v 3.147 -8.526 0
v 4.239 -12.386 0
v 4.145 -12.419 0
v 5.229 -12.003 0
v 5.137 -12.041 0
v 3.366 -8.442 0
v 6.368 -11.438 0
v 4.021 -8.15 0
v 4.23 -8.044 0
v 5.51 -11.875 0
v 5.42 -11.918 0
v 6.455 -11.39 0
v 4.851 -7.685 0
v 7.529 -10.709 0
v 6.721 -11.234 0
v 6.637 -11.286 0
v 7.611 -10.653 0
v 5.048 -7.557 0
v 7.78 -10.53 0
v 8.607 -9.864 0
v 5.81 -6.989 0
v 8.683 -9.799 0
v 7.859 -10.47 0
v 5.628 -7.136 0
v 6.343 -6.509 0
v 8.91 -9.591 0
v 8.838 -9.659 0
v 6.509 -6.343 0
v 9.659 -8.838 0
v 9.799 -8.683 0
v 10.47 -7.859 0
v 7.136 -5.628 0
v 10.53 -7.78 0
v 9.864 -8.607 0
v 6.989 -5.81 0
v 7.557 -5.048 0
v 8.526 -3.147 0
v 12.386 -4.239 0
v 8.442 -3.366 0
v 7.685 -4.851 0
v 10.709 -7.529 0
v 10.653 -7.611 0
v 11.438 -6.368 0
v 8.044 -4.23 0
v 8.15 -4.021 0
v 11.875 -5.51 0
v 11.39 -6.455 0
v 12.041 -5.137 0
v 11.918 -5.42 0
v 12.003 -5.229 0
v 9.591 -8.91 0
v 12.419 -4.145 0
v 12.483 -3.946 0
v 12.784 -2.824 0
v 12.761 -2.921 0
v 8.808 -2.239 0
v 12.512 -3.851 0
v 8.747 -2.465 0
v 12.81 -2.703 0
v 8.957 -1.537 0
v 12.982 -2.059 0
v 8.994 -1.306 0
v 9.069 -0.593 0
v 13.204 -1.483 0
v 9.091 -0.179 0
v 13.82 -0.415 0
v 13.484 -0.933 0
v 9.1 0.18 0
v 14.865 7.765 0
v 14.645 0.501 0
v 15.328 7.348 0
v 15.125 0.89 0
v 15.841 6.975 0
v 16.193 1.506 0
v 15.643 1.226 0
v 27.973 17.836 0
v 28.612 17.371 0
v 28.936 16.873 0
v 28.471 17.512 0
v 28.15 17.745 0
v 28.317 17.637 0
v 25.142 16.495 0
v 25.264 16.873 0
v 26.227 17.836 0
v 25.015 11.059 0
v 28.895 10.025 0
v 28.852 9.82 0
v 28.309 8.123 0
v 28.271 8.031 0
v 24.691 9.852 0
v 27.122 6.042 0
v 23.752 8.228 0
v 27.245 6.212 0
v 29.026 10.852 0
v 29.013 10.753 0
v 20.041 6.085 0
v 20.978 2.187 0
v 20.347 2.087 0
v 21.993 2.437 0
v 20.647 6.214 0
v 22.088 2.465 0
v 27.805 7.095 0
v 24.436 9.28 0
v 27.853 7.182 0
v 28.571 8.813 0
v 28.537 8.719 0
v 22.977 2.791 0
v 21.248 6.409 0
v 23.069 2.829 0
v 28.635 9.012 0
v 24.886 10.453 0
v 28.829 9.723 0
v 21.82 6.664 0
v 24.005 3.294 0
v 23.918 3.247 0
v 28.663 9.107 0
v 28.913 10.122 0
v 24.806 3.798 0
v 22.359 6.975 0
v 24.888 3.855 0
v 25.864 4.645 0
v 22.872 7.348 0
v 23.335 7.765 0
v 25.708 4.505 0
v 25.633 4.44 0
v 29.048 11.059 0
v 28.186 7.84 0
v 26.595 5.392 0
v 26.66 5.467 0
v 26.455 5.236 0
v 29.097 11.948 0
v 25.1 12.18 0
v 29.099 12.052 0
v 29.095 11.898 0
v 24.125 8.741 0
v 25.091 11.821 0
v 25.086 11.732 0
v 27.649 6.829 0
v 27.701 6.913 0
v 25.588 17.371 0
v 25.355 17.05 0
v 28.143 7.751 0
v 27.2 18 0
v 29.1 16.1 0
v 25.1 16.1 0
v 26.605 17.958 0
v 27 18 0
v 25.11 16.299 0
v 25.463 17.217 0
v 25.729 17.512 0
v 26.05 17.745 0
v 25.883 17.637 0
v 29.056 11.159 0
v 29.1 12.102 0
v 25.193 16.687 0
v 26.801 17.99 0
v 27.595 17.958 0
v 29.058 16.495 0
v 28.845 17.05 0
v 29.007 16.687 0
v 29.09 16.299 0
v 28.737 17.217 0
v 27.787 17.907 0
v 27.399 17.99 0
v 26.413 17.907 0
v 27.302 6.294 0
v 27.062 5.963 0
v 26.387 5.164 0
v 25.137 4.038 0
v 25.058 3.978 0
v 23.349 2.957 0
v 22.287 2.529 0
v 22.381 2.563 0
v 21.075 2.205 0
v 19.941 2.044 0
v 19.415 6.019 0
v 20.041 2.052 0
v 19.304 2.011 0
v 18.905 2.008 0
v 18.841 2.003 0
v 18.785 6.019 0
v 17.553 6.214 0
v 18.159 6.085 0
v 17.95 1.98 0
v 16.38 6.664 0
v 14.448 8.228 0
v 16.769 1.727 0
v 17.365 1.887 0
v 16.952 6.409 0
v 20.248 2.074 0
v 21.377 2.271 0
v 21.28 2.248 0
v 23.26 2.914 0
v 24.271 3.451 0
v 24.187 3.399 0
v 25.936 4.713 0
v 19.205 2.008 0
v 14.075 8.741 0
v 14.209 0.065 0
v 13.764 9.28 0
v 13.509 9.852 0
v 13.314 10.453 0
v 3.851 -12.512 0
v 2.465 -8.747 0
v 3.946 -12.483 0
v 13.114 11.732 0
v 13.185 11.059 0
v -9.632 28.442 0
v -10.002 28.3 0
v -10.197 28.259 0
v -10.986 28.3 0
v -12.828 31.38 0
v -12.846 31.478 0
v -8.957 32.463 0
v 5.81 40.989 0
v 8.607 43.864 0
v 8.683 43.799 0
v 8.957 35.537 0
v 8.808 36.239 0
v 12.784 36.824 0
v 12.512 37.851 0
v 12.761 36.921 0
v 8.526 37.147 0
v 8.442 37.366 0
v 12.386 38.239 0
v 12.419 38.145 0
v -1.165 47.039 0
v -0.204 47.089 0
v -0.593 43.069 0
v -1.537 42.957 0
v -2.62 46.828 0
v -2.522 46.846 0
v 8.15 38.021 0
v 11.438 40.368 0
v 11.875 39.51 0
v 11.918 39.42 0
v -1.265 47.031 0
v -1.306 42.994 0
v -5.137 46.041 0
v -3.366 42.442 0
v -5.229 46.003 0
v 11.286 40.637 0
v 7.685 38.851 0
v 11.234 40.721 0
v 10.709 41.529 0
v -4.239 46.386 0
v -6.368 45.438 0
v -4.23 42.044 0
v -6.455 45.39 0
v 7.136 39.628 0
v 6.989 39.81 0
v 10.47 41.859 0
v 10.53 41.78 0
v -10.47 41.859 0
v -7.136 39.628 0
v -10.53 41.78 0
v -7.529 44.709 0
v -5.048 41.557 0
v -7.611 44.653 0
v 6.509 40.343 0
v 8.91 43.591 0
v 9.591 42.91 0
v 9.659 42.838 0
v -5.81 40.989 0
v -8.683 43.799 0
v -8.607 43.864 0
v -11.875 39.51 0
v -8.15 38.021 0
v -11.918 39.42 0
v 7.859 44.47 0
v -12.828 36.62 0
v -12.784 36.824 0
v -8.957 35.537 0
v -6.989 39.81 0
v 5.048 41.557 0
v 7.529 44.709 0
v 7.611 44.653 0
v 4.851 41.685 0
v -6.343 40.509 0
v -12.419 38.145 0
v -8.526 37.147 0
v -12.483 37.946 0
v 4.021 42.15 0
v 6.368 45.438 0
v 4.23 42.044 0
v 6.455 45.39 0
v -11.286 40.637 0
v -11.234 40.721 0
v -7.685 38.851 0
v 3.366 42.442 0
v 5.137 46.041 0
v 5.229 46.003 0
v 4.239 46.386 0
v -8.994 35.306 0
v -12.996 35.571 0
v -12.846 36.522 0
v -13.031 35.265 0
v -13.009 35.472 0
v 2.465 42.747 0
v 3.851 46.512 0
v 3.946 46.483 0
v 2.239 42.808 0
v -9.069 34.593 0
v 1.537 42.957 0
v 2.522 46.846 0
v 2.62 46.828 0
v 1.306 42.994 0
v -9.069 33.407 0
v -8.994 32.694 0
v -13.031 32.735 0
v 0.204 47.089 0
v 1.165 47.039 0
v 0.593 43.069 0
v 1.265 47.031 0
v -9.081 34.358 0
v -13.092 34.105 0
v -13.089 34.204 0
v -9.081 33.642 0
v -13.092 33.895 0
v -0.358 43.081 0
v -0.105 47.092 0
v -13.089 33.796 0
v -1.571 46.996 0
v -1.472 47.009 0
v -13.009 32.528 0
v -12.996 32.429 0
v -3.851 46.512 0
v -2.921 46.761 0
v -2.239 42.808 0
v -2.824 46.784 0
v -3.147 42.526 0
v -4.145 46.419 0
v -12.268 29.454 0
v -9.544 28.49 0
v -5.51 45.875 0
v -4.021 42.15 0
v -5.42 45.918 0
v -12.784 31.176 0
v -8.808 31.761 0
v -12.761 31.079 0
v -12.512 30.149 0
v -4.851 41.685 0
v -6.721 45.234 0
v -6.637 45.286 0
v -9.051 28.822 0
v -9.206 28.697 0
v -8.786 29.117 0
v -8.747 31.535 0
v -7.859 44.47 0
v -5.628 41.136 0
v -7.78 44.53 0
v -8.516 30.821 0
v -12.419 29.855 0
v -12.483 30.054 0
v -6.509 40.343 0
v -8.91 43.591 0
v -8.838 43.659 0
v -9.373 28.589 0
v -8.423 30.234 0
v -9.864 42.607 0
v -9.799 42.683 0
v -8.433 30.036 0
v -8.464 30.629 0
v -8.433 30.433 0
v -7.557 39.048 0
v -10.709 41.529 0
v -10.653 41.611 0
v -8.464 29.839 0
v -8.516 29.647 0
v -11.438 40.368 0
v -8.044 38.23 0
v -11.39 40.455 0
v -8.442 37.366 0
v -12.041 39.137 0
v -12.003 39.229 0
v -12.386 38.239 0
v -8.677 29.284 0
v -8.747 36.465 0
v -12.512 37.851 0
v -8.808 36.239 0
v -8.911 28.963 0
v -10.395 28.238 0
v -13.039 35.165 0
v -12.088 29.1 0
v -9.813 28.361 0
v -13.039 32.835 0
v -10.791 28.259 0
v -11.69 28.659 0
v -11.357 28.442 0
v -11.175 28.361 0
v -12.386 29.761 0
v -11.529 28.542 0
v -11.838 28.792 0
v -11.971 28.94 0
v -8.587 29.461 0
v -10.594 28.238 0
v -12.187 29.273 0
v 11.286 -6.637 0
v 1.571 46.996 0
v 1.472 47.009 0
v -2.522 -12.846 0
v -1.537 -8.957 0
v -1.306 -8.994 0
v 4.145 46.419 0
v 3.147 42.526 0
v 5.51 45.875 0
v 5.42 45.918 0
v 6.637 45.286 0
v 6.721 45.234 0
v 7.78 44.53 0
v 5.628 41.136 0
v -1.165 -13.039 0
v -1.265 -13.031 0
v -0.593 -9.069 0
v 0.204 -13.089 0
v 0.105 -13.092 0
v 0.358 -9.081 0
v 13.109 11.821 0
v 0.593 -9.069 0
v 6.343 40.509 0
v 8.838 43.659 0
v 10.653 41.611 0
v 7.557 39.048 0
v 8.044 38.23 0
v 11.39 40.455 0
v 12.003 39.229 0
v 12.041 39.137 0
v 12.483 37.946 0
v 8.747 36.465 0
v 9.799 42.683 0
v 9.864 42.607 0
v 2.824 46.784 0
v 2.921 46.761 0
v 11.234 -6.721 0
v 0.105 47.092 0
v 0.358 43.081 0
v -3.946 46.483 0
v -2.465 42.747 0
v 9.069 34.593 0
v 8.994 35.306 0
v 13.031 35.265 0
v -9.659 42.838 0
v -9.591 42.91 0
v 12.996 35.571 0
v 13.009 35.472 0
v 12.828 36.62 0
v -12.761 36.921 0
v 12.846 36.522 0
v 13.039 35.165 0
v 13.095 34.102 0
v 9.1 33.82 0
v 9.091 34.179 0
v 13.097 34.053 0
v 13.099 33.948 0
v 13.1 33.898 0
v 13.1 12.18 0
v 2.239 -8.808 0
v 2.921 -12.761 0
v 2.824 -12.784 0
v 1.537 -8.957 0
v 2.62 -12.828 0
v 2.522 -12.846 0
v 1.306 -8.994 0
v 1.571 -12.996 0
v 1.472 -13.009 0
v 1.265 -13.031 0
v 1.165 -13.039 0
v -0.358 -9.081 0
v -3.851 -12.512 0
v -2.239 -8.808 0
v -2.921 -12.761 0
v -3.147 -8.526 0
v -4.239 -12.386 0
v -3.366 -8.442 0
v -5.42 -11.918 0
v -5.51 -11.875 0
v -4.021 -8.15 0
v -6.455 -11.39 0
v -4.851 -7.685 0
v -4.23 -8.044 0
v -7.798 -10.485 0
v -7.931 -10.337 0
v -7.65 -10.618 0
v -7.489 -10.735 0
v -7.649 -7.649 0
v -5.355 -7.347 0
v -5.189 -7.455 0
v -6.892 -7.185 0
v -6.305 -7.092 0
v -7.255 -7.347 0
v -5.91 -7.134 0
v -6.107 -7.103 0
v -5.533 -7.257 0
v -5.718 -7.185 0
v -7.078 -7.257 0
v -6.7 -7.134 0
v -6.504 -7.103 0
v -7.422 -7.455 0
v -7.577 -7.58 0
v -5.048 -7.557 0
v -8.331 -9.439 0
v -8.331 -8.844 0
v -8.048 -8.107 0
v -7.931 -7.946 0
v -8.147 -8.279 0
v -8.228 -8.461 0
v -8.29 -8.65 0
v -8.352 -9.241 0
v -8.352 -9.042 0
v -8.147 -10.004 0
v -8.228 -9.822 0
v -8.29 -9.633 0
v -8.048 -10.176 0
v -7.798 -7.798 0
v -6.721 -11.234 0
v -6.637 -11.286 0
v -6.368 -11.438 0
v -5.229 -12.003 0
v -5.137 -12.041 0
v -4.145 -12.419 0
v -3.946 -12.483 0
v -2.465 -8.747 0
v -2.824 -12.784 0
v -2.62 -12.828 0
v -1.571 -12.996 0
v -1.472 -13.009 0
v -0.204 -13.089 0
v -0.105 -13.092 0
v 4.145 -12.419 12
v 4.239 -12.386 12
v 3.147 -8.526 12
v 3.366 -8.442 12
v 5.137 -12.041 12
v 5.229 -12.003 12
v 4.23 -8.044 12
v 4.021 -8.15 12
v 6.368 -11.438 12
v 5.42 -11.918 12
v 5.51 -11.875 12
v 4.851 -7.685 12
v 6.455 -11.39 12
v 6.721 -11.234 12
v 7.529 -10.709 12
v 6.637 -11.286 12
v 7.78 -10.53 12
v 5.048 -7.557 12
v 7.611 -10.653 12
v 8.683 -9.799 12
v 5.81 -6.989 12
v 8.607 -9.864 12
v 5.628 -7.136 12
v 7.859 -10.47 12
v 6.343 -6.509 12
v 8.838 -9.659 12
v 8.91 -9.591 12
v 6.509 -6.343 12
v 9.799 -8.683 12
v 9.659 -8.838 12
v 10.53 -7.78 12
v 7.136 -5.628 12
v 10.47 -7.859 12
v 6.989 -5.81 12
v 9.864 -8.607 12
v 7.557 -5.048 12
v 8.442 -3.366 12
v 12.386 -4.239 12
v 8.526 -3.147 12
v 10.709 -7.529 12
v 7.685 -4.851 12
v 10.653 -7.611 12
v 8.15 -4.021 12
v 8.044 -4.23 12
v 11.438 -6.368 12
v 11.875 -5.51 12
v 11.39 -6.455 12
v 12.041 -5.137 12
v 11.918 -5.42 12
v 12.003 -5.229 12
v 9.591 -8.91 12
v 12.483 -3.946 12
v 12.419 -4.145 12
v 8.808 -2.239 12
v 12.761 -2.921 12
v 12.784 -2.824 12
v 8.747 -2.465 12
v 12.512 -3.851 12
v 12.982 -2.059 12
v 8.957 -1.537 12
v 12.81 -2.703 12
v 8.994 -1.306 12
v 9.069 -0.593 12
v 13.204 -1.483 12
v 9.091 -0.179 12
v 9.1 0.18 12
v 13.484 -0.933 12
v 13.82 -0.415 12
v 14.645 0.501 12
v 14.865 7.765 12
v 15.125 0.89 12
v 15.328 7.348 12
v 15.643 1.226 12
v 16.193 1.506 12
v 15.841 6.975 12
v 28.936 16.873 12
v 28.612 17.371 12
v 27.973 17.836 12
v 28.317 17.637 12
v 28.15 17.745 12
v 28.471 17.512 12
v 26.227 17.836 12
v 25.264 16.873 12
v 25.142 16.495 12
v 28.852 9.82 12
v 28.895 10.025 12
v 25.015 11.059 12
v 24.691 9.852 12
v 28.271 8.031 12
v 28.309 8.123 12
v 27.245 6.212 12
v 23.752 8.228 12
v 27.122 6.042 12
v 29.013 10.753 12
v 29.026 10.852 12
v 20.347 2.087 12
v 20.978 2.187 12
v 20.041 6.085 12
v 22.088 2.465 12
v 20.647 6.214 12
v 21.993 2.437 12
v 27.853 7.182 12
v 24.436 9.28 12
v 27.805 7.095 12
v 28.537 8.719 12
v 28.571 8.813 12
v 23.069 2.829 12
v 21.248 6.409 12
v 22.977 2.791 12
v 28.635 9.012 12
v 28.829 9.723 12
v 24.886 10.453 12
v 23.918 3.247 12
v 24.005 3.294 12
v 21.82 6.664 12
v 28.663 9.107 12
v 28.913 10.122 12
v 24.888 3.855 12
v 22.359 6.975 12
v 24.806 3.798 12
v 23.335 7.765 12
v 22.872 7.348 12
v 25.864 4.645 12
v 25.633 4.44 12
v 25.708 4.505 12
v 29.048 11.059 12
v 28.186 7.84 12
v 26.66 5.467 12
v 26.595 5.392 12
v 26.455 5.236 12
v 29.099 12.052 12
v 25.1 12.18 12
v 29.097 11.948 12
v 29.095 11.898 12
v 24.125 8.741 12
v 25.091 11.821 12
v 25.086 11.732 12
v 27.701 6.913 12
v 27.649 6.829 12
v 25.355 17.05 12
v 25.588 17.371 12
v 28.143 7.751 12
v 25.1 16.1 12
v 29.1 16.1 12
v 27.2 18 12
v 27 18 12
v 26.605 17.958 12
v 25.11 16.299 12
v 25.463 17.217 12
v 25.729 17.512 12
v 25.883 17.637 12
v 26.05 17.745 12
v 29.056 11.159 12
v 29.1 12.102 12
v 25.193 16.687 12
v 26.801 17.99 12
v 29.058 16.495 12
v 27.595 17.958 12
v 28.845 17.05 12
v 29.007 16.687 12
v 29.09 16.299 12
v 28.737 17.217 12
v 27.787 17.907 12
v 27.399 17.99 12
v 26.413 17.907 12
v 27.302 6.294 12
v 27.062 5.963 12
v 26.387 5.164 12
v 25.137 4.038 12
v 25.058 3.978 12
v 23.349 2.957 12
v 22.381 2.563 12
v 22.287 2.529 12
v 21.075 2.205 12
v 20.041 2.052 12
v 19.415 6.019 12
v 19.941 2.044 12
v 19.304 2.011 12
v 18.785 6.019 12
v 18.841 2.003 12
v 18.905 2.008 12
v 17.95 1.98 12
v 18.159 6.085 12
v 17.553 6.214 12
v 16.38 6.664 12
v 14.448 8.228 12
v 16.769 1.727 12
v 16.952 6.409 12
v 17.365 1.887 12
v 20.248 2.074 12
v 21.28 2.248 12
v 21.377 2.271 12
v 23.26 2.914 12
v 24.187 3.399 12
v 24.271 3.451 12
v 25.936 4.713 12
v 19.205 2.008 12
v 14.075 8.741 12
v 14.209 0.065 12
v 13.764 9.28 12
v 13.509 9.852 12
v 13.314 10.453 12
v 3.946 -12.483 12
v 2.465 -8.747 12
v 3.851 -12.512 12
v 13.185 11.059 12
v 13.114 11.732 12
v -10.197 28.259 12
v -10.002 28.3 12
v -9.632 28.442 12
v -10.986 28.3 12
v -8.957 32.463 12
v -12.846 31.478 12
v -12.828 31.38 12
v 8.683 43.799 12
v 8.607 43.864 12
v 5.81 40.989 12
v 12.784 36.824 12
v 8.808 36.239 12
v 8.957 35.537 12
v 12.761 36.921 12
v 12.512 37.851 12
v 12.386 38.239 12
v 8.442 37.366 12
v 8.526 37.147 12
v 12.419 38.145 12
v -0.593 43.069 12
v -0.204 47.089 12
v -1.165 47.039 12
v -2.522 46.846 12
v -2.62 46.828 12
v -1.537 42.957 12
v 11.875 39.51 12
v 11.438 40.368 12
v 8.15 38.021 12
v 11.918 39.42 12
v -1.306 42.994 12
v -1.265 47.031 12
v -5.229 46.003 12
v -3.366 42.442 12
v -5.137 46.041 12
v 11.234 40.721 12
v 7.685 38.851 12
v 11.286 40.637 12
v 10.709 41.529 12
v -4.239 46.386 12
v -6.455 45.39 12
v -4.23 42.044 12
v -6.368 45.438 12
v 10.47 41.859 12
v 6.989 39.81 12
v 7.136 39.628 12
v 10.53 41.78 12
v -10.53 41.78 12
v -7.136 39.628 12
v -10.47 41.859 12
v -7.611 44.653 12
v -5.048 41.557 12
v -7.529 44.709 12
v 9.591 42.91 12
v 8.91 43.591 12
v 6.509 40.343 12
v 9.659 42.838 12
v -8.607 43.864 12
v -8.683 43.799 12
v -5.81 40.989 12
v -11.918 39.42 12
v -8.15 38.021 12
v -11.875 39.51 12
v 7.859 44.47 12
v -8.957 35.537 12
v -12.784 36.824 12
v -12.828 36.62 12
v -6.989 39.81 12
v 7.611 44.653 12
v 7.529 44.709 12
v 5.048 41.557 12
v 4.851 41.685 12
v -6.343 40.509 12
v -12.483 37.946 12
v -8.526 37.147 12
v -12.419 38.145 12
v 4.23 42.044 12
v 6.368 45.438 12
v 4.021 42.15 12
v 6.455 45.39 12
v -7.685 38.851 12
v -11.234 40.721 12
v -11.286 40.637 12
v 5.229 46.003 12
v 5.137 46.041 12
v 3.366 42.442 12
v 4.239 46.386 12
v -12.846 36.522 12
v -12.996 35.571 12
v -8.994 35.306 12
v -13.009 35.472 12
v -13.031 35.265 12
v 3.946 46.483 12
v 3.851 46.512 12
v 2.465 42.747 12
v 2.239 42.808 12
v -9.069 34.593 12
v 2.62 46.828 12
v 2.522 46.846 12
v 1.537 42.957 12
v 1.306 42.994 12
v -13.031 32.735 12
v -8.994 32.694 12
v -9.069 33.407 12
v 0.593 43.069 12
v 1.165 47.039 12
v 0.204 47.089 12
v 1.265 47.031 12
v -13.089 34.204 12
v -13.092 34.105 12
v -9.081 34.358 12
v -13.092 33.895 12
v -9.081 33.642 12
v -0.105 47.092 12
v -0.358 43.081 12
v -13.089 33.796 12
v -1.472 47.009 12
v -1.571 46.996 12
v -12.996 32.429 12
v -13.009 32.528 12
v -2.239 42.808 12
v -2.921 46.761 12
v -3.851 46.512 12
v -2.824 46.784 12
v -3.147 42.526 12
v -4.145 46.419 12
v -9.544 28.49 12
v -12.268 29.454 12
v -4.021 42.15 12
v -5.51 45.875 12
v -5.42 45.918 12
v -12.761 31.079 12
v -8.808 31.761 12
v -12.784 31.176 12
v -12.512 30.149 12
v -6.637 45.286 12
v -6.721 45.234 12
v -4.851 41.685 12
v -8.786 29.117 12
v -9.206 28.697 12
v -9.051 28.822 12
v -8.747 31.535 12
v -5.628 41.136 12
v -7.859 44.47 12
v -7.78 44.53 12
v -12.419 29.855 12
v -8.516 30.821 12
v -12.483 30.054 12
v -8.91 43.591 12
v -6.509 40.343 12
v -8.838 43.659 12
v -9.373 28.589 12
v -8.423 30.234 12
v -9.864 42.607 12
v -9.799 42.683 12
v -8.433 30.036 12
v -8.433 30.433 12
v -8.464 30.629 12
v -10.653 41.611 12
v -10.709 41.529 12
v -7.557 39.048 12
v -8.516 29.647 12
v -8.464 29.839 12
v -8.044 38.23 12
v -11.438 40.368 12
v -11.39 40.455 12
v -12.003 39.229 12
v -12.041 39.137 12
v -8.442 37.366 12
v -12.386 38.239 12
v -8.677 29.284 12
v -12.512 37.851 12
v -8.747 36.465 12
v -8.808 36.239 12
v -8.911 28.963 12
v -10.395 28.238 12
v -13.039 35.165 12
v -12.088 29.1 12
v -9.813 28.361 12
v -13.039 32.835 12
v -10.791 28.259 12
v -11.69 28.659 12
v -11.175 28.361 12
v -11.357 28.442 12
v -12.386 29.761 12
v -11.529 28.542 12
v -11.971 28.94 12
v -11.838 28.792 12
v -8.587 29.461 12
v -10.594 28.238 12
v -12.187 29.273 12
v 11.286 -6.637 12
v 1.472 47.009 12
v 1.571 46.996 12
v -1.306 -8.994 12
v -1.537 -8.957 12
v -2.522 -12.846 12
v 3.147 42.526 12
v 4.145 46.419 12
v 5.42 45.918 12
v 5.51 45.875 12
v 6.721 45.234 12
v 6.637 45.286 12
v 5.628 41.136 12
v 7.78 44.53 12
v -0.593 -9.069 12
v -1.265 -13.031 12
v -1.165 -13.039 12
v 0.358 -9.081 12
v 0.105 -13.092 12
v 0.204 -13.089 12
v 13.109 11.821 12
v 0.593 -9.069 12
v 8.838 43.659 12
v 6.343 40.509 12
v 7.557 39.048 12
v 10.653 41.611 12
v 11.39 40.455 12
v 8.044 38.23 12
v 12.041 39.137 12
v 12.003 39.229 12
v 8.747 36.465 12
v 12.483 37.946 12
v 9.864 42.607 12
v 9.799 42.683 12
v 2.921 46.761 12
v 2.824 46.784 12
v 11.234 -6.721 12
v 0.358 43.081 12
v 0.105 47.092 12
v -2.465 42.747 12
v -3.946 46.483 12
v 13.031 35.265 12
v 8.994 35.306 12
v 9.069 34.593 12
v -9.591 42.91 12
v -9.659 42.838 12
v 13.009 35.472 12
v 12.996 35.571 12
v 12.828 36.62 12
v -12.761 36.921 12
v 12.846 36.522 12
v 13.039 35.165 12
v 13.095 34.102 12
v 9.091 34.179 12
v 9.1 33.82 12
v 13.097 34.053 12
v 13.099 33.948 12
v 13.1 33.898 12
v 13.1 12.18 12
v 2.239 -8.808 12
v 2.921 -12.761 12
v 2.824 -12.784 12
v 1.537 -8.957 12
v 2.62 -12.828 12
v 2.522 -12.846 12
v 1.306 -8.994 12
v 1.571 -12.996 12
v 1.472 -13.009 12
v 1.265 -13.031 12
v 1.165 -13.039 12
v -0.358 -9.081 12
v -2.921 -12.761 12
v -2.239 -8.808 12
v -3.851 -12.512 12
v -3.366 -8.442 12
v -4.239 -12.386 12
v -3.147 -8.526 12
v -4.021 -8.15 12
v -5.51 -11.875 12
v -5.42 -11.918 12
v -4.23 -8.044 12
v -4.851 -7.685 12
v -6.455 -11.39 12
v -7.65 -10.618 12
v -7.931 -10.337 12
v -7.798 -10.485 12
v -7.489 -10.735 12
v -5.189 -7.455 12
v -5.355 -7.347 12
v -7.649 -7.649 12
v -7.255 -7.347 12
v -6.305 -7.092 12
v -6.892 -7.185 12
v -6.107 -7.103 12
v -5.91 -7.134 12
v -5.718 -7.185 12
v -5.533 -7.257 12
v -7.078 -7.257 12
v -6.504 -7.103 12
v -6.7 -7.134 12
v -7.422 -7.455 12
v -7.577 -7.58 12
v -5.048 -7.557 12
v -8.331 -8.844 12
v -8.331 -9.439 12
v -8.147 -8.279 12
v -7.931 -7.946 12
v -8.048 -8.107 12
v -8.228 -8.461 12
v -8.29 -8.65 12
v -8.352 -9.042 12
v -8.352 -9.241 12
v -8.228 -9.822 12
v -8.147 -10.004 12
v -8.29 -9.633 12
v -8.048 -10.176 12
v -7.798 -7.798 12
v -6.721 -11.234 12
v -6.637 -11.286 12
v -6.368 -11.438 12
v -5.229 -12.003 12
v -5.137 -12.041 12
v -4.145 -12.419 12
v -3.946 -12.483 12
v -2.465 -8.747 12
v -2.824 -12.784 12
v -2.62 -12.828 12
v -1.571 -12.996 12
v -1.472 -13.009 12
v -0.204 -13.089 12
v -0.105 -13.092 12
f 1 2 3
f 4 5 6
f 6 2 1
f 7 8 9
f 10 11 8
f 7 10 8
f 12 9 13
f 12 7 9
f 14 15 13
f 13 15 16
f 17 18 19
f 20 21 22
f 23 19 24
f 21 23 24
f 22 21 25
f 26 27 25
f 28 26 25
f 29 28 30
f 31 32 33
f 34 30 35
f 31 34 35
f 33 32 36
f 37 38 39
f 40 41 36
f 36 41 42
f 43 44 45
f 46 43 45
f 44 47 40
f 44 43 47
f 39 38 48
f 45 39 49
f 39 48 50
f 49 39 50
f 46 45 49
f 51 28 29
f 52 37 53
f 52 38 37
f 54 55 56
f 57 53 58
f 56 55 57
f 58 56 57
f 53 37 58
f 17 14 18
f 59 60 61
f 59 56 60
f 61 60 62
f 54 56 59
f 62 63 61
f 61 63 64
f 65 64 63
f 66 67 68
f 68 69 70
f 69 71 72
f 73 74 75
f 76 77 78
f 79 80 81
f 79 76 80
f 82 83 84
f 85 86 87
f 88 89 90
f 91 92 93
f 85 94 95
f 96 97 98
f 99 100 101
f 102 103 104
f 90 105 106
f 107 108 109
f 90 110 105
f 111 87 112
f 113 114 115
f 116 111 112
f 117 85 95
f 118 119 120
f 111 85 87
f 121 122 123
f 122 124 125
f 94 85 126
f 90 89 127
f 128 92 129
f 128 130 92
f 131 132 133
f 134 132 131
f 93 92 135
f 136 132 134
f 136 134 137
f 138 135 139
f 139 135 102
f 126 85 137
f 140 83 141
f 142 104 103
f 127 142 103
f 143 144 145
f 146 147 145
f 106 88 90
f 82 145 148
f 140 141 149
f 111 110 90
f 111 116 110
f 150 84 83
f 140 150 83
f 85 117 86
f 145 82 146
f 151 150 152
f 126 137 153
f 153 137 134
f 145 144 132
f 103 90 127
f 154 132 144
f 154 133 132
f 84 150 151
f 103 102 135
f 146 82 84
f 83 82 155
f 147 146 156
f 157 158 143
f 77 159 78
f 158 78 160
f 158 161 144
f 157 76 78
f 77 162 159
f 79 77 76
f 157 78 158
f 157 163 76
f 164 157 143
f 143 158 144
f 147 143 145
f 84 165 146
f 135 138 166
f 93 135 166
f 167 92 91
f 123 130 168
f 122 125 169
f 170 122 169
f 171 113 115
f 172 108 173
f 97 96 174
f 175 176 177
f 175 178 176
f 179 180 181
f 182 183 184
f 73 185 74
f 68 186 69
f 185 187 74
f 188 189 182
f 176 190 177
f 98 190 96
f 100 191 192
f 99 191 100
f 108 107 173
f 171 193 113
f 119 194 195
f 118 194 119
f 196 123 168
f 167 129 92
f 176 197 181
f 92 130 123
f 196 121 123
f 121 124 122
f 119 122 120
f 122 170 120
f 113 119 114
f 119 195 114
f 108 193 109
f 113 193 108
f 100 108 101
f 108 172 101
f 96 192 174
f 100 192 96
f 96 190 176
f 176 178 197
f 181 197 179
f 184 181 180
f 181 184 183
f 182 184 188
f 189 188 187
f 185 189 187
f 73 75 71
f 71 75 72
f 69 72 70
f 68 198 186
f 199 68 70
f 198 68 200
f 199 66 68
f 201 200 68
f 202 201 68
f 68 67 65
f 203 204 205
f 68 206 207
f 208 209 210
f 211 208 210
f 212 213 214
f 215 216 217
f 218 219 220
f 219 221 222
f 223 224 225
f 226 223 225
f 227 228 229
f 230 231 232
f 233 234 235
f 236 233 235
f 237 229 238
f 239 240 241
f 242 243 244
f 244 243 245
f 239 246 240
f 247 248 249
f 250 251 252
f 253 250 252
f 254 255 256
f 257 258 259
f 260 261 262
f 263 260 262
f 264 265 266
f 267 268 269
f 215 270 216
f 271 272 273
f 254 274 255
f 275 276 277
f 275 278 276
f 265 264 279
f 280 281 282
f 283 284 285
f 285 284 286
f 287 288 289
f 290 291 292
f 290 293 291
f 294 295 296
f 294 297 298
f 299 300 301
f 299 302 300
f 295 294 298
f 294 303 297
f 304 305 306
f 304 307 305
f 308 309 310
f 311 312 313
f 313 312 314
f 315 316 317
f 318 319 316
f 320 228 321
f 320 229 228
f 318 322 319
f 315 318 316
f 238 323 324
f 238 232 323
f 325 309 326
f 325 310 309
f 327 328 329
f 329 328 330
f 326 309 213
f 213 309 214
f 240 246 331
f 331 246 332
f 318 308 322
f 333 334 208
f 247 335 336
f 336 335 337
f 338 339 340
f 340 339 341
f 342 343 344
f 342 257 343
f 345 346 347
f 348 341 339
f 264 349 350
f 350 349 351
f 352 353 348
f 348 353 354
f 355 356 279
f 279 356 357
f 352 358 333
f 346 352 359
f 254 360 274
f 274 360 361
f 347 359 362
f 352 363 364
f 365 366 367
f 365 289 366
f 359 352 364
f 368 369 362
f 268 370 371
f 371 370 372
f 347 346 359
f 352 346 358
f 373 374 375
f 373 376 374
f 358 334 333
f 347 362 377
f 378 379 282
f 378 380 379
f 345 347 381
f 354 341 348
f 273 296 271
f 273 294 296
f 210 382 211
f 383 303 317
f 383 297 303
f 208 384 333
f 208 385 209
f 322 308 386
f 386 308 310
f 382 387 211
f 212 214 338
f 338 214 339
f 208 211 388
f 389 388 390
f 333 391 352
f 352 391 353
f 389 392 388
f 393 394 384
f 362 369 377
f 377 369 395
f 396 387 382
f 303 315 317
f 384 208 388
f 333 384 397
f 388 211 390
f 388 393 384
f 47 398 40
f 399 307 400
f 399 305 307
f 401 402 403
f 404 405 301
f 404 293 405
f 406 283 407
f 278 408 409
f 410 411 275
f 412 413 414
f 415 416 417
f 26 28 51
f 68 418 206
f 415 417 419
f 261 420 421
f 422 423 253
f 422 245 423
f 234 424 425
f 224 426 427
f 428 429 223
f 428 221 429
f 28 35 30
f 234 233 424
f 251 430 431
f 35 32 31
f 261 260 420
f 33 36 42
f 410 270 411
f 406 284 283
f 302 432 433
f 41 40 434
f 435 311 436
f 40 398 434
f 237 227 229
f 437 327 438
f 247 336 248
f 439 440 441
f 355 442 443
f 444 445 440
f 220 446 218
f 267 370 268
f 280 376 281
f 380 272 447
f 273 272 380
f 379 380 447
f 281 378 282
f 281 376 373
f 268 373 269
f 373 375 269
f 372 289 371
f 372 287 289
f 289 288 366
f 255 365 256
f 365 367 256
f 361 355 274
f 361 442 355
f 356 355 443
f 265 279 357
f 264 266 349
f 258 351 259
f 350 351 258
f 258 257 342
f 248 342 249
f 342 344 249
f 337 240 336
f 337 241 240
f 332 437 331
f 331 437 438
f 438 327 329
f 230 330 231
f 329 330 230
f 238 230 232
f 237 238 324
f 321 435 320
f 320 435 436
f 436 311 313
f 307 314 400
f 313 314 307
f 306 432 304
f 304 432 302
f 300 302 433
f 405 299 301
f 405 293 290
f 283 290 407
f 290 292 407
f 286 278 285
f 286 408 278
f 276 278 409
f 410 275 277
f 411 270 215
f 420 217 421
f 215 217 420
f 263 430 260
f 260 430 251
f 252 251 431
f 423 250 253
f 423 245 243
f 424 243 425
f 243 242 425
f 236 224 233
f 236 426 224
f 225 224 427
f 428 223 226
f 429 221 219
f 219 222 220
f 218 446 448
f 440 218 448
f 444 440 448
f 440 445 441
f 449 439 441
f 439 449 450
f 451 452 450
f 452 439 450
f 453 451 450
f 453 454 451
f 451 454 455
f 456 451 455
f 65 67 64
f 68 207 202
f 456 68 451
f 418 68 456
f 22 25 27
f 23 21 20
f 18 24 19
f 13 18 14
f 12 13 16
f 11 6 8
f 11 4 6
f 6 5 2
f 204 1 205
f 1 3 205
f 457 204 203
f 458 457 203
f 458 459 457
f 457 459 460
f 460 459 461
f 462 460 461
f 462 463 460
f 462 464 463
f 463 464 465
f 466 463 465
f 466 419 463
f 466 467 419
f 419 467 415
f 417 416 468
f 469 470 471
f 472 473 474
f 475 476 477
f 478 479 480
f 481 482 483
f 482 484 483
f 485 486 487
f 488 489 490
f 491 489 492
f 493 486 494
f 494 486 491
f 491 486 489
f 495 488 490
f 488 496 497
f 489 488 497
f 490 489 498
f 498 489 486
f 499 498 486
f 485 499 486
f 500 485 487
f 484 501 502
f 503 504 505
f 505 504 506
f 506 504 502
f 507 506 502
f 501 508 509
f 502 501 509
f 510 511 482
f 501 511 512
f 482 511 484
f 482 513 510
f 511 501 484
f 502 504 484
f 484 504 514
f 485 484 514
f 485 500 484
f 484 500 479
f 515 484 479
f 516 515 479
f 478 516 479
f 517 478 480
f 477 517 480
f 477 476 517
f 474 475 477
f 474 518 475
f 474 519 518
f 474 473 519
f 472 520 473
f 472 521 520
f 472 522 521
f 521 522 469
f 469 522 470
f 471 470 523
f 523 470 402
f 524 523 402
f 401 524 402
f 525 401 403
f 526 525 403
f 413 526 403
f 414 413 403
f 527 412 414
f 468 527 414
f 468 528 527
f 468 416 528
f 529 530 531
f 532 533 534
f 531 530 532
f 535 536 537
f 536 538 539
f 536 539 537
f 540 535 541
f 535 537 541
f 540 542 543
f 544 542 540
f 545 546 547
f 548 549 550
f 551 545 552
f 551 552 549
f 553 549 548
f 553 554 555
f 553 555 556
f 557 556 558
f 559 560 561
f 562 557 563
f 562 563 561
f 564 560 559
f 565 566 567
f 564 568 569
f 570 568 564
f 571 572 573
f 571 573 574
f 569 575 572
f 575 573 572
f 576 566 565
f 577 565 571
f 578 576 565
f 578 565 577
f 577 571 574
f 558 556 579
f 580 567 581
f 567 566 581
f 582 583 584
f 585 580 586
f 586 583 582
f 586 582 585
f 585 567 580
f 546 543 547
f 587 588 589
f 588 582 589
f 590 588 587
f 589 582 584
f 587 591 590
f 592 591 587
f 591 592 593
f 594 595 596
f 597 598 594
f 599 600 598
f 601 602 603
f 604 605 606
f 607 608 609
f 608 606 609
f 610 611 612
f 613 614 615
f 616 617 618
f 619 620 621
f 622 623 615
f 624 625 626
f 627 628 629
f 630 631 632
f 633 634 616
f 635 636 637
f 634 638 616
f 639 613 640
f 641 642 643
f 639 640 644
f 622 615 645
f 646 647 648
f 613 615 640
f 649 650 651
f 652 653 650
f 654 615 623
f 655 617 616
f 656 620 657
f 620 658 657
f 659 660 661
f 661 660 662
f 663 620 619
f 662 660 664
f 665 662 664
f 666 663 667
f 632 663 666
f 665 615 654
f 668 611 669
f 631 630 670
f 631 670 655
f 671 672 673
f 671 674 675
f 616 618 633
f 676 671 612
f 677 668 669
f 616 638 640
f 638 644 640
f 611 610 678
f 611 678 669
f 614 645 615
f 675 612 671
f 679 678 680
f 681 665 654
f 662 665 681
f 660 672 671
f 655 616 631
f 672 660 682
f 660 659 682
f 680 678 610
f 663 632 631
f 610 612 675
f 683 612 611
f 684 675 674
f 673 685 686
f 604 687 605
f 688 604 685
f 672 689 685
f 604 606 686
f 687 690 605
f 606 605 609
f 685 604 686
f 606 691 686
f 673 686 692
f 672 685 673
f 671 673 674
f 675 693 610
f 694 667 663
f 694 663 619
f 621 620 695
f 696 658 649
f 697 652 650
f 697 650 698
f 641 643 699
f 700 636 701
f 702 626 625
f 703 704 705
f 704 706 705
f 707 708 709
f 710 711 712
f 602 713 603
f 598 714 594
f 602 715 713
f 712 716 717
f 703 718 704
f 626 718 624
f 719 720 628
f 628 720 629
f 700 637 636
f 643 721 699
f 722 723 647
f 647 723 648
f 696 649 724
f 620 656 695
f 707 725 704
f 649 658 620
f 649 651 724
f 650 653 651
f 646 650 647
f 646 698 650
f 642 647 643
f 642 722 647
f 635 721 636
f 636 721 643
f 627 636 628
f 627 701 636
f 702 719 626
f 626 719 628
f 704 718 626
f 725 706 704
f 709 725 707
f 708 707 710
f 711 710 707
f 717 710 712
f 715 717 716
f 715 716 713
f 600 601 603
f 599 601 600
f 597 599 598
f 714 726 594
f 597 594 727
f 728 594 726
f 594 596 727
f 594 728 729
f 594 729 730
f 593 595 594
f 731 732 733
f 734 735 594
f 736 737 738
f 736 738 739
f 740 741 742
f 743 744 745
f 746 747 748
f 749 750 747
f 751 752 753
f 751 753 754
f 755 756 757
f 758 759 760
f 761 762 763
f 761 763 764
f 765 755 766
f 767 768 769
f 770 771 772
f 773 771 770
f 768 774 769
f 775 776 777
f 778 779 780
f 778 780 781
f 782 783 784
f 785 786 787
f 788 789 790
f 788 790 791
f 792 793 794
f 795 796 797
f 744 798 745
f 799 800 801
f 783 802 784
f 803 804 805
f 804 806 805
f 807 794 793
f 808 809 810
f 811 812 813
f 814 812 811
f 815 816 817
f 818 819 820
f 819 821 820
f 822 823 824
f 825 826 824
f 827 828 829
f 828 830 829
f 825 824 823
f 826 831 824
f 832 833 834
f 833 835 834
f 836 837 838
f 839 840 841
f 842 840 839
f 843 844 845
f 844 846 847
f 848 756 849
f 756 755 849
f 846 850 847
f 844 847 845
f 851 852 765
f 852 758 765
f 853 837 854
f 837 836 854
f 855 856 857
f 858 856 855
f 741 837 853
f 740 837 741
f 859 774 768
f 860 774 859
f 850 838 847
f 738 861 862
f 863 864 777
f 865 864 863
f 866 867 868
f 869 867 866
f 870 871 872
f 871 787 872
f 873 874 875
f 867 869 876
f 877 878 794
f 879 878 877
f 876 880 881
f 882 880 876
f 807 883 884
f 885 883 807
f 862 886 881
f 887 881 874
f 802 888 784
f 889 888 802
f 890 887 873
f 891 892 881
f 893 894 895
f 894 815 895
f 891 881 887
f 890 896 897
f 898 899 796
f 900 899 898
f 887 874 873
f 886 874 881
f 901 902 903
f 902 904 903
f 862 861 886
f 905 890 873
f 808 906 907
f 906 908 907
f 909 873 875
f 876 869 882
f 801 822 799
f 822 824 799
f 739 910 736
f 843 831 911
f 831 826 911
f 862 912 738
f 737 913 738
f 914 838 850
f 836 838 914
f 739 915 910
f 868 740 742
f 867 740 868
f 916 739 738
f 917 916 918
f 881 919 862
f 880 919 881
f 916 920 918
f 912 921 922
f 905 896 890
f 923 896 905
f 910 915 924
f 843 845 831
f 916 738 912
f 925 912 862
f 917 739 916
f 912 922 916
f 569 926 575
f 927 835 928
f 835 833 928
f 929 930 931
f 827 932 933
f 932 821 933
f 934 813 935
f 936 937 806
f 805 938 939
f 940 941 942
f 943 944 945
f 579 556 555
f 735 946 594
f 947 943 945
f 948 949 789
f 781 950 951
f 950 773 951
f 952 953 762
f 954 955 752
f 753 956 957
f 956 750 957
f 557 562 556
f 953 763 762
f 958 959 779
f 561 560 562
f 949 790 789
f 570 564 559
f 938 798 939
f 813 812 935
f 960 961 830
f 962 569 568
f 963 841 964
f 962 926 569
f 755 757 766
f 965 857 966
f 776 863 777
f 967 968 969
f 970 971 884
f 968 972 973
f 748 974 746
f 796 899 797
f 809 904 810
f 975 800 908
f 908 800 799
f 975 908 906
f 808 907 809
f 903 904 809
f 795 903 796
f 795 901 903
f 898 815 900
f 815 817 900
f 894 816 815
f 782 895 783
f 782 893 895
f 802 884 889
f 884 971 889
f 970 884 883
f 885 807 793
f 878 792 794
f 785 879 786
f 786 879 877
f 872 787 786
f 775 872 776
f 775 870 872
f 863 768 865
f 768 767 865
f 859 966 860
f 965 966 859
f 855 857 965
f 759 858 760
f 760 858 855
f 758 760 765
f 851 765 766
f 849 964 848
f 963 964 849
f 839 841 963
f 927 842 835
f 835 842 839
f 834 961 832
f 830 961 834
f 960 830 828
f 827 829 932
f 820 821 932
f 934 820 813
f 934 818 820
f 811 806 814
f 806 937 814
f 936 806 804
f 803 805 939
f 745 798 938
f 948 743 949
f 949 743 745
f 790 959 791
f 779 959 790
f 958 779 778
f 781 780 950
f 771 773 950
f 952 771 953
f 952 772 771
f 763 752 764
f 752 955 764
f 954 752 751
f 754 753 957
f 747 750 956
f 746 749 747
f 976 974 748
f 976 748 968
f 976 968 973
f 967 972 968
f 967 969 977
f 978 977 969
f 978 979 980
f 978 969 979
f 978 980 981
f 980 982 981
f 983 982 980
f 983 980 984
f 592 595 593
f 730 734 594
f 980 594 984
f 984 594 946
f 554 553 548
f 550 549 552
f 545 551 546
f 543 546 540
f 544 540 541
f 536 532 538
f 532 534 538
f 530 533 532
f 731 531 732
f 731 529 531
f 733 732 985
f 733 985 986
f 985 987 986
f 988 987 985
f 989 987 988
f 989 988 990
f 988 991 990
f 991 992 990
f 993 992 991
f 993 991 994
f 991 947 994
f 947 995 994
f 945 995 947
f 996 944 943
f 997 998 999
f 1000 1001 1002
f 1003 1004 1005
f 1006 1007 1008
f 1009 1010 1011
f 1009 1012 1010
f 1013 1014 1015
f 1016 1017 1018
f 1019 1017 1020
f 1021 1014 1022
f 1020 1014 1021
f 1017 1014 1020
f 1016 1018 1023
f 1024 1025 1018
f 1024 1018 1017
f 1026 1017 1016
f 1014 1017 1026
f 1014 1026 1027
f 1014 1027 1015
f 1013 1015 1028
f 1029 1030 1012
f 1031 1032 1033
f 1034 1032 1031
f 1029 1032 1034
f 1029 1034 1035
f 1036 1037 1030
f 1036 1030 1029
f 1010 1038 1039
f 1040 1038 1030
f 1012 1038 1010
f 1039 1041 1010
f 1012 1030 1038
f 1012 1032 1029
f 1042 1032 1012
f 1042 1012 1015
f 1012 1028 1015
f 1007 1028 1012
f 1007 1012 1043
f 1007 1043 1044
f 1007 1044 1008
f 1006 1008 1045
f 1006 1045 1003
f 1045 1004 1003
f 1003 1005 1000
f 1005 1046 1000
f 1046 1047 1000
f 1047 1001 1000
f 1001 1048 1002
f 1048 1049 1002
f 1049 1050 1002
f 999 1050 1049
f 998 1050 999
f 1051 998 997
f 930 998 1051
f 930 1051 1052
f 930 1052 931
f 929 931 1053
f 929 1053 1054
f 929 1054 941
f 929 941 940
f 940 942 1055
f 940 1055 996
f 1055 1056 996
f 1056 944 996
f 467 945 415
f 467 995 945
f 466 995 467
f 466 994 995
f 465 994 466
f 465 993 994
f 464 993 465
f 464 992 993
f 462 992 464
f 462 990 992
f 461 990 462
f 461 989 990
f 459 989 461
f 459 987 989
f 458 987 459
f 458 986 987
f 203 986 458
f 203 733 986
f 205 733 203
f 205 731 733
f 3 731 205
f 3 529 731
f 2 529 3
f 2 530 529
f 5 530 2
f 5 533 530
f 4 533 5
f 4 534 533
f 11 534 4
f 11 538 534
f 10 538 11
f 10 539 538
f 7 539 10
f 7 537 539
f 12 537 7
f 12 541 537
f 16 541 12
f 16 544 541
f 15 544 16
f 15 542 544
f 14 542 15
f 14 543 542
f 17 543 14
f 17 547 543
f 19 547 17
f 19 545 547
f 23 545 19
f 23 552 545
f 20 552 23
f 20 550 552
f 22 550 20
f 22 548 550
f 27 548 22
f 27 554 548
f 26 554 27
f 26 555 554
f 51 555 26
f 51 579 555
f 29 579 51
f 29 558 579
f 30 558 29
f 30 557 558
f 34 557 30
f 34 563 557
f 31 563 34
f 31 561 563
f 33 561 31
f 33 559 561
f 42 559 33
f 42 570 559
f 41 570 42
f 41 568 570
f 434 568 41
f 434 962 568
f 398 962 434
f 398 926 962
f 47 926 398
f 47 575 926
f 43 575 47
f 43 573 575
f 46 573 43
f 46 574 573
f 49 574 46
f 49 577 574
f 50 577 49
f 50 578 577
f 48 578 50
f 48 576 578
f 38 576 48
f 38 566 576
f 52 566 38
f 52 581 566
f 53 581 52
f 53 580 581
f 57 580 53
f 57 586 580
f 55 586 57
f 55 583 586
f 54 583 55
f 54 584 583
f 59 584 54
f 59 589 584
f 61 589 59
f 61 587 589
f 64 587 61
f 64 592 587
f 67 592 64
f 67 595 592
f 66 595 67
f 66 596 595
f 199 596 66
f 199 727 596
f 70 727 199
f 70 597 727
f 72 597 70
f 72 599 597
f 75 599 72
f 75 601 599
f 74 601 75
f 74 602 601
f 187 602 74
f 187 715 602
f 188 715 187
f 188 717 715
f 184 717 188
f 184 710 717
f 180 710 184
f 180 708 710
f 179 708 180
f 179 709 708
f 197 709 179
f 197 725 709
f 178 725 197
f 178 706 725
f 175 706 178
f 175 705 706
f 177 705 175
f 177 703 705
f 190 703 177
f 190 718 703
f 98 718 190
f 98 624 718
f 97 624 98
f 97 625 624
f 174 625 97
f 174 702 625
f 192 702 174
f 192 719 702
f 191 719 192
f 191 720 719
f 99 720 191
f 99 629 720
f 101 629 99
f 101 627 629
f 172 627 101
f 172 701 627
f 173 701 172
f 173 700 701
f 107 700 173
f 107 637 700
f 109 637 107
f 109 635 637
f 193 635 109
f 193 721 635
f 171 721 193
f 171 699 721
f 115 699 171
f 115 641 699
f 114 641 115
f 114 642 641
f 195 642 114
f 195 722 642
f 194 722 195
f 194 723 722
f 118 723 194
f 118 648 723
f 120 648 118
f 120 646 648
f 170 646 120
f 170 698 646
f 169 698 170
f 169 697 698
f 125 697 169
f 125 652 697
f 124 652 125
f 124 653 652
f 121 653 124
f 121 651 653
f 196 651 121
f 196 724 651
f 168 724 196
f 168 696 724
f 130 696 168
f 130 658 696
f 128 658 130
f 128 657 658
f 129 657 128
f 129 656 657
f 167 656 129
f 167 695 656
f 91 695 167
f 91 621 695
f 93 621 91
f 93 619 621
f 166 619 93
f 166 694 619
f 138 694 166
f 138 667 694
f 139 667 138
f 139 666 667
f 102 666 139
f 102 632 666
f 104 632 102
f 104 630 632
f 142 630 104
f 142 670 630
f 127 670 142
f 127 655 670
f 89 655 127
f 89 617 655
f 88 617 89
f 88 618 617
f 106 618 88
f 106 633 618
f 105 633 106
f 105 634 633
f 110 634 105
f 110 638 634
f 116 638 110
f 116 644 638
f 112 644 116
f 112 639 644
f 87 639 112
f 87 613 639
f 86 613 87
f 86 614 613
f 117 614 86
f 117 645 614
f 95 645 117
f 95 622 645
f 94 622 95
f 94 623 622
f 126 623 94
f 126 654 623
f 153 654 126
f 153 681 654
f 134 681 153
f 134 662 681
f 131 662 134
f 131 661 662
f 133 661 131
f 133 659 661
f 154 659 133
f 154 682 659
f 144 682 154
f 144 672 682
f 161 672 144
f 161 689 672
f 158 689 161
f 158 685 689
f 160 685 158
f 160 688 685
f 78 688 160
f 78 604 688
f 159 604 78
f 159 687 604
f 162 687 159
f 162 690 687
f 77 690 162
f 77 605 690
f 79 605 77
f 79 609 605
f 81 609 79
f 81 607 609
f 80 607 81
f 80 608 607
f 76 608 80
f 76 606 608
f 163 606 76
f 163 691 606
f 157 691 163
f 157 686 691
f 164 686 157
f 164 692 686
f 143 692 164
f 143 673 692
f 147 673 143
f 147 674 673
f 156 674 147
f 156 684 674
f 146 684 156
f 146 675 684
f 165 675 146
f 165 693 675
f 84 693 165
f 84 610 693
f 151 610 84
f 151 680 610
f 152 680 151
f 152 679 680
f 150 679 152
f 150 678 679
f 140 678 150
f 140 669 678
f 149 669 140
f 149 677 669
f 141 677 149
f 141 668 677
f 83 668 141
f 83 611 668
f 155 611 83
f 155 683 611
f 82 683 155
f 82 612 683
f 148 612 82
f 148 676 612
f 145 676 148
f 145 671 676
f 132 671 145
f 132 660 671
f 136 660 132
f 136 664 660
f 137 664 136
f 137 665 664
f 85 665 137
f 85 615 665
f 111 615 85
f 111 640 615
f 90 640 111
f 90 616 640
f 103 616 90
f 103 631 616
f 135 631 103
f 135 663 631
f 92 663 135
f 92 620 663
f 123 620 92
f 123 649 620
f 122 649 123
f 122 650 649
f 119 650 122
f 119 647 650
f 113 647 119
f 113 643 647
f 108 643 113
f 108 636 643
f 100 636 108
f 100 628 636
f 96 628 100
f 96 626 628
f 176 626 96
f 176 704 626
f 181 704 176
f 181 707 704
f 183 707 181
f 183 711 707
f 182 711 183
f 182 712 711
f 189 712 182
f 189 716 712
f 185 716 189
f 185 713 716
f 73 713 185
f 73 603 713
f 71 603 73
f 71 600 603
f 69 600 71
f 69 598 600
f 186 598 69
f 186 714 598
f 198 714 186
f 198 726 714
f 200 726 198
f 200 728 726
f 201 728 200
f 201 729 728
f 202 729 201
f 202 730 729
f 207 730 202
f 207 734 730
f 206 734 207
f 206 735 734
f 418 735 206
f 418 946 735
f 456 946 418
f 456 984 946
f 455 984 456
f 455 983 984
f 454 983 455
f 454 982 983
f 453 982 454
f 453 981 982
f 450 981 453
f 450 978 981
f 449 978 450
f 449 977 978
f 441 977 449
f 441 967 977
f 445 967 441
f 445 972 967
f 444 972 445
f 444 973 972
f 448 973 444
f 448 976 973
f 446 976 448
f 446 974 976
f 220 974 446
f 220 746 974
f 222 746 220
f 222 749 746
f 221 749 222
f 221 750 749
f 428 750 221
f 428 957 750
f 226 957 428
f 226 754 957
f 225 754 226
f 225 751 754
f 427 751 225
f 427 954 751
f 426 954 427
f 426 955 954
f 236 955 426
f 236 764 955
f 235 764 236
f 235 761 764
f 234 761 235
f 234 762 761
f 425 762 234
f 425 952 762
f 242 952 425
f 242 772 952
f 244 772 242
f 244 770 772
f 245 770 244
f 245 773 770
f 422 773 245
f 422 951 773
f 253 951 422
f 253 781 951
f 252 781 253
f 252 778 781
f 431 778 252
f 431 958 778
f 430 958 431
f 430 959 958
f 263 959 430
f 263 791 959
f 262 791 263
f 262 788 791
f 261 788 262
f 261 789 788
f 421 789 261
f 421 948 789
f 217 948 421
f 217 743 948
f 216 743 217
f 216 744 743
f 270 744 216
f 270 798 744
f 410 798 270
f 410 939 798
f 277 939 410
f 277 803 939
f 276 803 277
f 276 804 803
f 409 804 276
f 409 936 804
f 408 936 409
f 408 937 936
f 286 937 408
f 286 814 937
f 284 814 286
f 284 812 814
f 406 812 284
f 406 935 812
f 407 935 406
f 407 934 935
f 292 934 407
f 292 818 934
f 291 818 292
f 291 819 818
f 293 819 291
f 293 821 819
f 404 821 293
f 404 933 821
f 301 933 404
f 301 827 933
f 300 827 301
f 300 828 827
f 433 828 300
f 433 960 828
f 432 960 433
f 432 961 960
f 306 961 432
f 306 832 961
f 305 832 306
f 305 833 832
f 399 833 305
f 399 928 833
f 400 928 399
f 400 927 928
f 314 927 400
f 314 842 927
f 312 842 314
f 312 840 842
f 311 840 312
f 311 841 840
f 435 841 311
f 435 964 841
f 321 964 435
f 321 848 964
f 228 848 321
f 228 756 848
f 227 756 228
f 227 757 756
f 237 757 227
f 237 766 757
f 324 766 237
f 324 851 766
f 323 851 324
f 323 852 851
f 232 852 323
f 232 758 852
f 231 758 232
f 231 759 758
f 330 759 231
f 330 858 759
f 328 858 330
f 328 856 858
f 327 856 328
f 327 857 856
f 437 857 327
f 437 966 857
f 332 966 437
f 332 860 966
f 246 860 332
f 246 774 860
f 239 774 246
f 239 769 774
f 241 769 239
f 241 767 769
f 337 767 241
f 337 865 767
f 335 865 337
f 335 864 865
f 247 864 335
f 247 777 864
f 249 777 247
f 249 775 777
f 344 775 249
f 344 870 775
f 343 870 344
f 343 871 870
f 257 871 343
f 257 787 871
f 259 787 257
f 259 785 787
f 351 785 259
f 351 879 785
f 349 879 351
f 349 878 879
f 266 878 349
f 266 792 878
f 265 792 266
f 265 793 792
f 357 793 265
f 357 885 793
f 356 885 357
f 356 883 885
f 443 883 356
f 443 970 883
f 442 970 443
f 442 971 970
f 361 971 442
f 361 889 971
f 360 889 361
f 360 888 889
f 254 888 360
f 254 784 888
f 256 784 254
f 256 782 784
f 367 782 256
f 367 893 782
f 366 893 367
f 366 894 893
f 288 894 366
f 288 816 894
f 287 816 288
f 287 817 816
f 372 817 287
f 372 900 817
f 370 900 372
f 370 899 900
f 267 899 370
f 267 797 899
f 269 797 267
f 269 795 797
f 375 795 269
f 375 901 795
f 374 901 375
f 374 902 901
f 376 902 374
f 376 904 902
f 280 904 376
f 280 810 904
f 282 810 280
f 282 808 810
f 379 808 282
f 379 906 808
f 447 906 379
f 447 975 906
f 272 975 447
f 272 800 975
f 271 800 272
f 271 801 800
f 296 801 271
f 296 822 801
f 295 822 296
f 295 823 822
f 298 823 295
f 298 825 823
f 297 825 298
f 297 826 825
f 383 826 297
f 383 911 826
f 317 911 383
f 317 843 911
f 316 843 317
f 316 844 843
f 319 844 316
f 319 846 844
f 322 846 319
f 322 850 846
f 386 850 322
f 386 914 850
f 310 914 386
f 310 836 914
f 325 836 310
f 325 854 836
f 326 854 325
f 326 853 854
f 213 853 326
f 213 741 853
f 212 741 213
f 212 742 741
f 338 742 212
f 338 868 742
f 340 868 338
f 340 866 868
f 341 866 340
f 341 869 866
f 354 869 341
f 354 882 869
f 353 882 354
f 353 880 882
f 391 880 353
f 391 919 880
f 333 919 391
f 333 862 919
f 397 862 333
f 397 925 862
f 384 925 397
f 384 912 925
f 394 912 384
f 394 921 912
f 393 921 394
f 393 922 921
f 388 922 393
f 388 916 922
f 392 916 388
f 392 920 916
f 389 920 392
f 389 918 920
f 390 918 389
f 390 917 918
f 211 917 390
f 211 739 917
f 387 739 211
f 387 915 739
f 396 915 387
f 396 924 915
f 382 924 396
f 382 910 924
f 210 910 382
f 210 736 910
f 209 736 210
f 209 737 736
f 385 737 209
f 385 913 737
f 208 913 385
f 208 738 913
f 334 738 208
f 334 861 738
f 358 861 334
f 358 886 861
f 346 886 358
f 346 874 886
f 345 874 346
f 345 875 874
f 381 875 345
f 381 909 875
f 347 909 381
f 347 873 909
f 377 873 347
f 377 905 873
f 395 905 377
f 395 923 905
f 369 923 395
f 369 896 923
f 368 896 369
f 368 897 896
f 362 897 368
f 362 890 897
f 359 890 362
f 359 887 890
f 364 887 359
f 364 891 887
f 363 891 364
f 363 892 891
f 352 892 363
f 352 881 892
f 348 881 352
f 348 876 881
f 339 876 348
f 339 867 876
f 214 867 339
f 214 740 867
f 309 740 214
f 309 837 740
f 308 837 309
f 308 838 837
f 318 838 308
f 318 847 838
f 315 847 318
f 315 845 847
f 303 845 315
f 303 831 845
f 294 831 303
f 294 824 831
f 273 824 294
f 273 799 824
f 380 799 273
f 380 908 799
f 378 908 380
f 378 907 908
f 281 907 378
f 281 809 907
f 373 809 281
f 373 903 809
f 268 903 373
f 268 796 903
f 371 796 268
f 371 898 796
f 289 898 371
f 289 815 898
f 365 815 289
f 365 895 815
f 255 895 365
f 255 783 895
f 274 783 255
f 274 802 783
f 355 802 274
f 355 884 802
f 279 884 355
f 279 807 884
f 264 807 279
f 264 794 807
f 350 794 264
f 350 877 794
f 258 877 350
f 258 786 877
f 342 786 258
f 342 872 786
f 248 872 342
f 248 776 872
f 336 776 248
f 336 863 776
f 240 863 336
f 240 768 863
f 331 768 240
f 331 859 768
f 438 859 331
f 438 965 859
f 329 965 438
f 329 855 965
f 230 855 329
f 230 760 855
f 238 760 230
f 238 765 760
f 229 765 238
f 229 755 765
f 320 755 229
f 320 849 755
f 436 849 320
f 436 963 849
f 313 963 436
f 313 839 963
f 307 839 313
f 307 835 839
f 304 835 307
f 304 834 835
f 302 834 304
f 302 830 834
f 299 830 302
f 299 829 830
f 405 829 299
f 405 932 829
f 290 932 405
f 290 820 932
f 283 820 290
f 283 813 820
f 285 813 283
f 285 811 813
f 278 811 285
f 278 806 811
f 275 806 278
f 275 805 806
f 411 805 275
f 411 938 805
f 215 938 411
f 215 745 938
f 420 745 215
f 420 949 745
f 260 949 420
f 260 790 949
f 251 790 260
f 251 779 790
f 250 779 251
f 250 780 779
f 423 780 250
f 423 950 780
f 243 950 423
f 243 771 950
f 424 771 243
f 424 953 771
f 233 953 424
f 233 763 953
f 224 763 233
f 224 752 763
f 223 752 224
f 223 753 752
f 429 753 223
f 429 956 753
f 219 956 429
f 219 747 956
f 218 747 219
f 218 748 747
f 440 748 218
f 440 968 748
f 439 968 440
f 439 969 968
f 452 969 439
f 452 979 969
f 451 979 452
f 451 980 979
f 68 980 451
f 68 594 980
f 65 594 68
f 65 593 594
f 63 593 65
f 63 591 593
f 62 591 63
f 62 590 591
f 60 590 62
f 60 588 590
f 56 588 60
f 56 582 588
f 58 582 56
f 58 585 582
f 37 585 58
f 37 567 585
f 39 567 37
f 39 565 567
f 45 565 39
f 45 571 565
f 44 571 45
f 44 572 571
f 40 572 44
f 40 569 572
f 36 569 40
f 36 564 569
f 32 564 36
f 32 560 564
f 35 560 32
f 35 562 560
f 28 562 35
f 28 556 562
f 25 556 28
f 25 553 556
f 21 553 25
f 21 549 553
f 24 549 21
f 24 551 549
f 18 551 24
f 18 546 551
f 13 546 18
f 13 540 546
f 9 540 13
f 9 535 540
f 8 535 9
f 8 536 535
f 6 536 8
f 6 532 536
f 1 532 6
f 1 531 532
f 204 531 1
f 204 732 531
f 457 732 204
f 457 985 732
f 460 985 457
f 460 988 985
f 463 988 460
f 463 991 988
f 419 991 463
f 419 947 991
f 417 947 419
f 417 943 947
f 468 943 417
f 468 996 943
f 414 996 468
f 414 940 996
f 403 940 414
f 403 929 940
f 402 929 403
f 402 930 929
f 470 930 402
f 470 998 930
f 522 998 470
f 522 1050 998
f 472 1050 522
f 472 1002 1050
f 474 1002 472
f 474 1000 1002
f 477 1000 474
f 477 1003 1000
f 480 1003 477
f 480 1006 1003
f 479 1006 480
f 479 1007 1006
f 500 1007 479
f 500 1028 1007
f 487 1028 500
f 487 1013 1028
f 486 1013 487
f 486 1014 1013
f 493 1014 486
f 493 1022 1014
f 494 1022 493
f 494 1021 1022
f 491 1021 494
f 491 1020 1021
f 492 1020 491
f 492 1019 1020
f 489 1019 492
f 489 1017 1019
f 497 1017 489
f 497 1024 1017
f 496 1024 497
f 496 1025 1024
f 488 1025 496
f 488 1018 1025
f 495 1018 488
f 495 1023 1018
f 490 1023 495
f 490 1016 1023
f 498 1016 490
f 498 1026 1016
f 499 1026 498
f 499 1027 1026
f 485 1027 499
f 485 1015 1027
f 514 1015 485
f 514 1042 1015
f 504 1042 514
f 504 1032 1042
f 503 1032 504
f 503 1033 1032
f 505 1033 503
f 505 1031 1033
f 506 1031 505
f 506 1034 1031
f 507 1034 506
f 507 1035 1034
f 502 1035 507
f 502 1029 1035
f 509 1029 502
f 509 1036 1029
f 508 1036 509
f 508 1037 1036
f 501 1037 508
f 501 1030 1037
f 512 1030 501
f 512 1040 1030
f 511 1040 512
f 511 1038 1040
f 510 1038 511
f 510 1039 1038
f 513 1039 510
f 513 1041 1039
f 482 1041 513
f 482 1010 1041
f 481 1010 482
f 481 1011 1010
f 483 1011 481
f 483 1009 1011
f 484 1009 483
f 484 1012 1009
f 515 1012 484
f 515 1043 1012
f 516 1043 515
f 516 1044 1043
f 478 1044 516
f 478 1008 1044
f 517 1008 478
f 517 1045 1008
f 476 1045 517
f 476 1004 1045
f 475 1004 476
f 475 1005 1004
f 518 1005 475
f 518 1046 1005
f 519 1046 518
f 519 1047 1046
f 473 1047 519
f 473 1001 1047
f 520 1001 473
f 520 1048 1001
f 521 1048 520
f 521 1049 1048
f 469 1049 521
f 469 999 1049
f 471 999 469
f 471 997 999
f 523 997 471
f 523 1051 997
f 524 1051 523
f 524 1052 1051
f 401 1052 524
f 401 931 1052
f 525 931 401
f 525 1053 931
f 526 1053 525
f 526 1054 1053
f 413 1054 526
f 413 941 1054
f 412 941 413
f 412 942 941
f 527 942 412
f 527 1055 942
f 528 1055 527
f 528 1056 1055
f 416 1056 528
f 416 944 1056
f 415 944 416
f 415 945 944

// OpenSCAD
diameter=18.2; // measured : bar diameter
distance=52.2; // measured : distance between the bars (including bars)
thickness=4; // wall thickness
space_h=12; // front hook distance
shift_h=12; // front hook shift
height_h=6; // front hook height
alpha_t=210; // top hook angle
alpha_b=135; // bottom hook angle
$fn=60;
width=12; // width of the hook

radius=diameter/2;
distance_c=distance-2*radius;
radius_h=space_h/2;

module part_square(p_size,p_alpha) {
if (p_alpha < 0)
    mirror([0,1]) part_square(p_size,-p_alpha);
else if (p_alpha >= 360)
    part_square(p_size,p_alpha-360);
else if (p_alpha >= 180)
    union() {
        translate([-p_size,0]) square([2*p_size,p_size]);
        rotate(180) part_square(p_size,p_alpha-180);
    }
else if (p_alpha >= 90)
    union() {
        square([p_size,p_size]);
        rotate(90) part_square(p_size,p_alpha-90);
    }
else if (p_alpha > 45)
    difference() {
        square([p_size,p_size]);
        mirror([1,-1]) part_square(p_size,90-p_alpha);
    }
else
    polygon([[0,0],[p_size,0],[p_size,tan(p_alpha)*p_size]]);
}

module part_ring(p_radius,p_thickness,p_alpha){
    p_length=p_radius+p_thickness;
    intersection() {
        difference() {
            circle(p_length);
            circle(p_radius);
        }
        part_square(p_length,p_alpha);
    };
}

module all(){
linear_extrude(width){
    translate([0,distance_c]) part_ring(radius,thickness,alpha_t);
   translate([radius,0]) square([thickness,distance_c]);
    mirror([0,1]) part_ring(radius,thickness,alpha_b);
    translate([radius+radius_h+thickness,shift_h]) rotate(180) 
        part_ring(radius_h,thickness,180);
    translate([radius+2*radius_h+thickness,shift_h]) 
        square([thickness,height_h]);
}
}//remix ....turned the above code into a module called ... all

// remix added module below
module round2d(OR,IR){
    offset(OR)offset(-IR-OR)offset(IR)children();
}

// remix this bit does the internal fillet + external radius
// the round2d module will only work with 2D shapes so projection cuts the profile into 2D then internal and external rads are applied .... then extruded back to height.

linear_extrude(height=width){
round2d(OR=thickness/2-0.1,IR=thickness*1.475)
projection(cut=true) all();
}
